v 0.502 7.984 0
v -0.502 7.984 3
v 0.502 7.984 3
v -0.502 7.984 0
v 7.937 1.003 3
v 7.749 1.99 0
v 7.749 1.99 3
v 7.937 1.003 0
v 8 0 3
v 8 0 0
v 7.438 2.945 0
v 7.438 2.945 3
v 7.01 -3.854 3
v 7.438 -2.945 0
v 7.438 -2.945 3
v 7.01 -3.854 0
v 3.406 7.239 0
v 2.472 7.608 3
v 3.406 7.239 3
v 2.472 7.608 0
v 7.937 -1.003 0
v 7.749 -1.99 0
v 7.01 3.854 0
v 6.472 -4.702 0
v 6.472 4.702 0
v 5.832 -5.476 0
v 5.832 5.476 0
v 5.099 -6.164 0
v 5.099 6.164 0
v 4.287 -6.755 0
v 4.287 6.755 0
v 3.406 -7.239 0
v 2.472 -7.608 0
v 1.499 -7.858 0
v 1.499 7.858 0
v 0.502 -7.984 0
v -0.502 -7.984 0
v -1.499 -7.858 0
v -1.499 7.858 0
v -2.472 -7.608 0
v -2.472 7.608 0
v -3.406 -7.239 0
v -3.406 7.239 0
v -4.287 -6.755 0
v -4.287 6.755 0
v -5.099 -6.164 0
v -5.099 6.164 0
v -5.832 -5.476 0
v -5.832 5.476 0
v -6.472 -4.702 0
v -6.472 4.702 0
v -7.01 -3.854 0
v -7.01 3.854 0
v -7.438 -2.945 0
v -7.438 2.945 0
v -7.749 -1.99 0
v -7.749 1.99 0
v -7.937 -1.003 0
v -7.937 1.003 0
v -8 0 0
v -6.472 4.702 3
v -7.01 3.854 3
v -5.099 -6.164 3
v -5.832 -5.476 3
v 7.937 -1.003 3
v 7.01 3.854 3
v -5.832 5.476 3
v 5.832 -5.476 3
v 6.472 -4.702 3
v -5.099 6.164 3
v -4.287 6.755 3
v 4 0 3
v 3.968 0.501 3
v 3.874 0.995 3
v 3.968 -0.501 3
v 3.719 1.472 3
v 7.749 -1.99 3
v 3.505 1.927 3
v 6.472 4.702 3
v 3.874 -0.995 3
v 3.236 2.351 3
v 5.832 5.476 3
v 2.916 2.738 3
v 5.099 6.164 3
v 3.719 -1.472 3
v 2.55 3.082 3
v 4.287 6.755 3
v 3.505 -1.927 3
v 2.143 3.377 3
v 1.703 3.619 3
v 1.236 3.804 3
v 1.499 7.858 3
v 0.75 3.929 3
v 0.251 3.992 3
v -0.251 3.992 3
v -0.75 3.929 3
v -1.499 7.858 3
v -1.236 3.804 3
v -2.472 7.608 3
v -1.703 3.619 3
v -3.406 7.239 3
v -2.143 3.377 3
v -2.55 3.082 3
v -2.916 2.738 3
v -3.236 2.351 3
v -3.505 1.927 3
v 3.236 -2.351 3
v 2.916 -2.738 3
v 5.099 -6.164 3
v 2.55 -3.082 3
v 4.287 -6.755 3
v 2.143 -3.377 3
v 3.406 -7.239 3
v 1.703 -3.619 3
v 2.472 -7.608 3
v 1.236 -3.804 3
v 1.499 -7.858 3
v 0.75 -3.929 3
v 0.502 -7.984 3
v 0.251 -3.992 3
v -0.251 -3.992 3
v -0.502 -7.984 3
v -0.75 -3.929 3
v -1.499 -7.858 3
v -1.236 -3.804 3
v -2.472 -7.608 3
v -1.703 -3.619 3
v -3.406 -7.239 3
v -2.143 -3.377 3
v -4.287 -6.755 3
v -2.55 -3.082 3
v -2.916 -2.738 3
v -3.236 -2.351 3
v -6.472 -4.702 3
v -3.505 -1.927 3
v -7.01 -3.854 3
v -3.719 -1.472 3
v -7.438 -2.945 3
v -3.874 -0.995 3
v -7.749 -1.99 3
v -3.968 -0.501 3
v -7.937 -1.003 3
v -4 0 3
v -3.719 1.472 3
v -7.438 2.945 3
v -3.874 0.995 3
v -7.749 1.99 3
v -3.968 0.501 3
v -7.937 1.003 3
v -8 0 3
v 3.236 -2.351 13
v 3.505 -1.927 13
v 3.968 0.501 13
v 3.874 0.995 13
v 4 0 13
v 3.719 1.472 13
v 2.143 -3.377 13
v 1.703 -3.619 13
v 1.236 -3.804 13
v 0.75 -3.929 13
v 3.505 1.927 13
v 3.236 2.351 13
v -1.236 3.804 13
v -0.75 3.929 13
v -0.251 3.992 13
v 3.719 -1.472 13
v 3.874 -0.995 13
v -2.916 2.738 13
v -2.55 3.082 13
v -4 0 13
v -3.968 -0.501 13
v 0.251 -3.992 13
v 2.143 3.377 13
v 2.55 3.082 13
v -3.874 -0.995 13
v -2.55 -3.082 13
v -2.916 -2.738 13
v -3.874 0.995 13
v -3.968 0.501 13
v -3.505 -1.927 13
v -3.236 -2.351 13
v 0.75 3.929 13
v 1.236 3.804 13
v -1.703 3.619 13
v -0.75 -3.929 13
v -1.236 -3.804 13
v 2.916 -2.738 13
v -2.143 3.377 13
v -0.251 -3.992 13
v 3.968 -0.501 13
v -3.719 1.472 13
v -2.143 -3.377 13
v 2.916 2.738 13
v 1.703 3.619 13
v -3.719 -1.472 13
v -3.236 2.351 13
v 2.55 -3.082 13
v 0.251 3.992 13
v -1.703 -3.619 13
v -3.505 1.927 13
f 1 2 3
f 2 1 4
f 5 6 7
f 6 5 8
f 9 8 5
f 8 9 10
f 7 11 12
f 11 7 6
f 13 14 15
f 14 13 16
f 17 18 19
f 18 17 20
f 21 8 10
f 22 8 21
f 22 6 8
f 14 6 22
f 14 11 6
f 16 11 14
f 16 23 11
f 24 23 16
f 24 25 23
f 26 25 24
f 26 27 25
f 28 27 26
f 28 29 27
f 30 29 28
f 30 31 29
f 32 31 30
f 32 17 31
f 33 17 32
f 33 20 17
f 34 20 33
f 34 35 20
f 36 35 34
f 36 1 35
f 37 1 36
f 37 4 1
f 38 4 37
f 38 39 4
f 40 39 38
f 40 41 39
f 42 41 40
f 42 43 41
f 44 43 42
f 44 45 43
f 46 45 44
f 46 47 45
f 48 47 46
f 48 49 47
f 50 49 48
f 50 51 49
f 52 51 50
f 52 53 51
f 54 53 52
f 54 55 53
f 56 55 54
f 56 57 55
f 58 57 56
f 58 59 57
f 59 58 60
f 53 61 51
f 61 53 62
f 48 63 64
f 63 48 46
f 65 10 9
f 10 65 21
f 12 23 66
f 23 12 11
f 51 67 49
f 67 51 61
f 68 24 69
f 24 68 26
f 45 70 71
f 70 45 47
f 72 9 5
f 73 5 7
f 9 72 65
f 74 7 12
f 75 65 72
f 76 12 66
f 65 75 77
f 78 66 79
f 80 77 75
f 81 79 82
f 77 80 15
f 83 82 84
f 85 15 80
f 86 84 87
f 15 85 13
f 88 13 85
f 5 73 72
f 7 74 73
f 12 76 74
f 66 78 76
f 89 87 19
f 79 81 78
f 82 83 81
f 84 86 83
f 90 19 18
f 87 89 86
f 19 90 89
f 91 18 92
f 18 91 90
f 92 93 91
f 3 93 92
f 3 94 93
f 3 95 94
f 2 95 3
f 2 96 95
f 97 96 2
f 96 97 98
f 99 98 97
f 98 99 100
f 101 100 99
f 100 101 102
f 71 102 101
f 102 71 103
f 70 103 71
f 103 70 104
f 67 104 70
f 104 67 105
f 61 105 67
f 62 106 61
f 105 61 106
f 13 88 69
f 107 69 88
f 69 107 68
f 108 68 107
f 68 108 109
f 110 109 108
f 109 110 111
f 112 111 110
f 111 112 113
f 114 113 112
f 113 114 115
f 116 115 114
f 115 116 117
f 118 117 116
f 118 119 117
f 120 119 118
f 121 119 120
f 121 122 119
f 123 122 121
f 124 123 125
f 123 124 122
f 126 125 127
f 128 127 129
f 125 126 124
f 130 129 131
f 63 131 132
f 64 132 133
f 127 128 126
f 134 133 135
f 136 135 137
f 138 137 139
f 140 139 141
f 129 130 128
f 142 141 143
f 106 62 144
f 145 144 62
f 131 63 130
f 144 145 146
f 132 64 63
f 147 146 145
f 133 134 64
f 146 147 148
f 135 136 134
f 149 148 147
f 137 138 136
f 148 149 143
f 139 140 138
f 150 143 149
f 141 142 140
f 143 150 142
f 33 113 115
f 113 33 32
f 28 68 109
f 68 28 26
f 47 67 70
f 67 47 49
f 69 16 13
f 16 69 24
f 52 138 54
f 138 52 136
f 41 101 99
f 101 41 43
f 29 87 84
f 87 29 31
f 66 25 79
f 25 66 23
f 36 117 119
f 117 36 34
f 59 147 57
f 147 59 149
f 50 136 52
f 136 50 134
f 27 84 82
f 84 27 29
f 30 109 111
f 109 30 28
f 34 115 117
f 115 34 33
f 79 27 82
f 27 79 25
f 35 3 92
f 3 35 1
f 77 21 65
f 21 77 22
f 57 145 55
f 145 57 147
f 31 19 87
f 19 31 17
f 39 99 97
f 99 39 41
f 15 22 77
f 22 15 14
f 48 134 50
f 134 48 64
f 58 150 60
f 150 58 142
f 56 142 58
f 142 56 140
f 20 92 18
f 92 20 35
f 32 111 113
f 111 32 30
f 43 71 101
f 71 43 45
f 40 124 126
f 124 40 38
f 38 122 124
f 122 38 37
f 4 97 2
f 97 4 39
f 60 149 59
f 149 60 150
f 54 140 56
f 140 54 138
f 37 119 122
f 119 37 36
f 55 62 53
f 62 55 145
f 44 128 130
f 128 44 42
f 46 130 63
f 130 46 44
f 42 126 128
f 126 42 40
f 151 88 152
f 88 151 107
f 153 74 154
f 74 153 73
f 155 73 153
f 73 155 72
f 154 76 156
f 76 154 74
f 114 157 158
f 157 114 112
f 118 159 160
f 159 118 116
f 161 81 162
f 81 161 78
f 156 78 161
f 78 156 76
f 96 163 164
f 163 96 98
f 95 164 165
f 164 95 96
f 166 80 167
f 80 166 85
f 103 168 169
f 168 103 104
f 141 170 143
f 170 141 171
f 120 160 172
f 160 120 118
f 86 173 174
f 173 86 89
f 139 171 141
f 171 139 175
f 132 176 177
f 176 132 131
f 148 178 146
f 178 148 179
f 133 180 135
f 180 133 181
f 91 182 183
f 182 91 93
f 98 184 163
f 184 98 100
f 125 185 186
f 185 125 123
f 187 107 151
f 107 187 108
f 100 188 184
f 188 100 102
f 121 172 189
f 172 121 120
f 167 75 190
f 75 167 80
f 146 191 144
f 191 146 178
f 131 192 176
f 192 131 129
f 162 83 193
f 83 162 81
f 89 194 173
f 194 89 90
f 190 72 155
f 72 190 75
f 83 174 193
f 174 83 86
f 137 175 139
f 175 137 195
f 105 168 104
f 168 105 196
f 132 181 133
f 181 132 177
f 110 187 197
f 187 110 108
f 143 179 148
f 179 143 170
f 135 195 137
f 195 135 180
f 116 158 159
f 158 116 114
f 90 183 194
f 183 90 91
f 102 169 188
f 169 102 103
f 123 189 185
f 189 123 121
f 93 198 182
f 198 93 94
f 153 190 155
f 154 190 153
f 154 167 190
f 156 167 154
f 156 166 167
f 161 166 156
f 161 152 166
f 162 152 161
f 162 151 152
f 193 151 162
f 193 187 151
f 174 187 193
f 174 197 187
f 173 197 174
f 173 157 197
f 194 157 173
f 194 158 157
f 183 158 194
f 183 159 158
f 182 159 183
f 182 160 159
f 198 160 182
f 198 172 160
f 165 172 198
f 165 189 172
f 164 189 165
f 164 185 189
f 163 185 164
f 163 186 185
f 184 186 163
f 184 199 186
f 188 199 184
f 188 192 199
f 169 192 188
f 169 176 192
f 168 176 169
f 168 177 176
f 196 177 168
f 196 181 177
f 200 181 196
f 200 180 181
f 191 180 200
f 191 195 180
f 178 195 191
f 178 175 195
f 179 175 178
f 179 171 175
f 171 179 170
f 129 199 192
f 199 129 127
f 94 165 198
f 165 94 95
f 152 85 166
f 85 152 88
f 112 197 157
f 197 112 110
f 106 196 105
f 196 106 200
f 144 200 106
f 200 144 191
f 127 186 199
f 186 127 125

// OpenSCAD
// file: ../../lib/joint/joint_pin.scad
// Pin Connectors V2
// Tony Buser <tbuser@gmail.com>

//pin_tack(h=10);

module pin_simple(h=10, r=4, bh=3, br=8) {
  // bh = base_height
  // br = base_radius

  union() {
    cylinder(h=bh, r=br, $fn=50);
    translate([0, 0, bh]) cylinder(h=h, r=r, $fn=50);
  }
}

module pin_tack(h=10, r=4, lh=3, lt=1, bh=3, br=4) {
  // bh = base_height
  // br = base_radius
  
  union() {
    cylinder(h=bh, r=br, $fn=50);
    translate([0, 0, bh]) pin(h, r, lh, lt);
  }
}
// just call pin instead, I made this module because it was easier to do the rotation option this way
// since openscad complains of recursion if I did it all in one module
module pin(h=10, r=4, lh=3, lt=1) {
  // h = shaft height
  // r = shaft radius
  // lh = lip height
  // lt = lip thickness

  difference() {
    pin_solid(h, r, lh, lt);
    
    // center cut
    translate([-r*0.5/2, -(r*2+lt*2)/2, h/4]) cube([r*0.5, r*2+lt*2, h]);
    translate([0, 0, h/4]) cylinder(h=h+lh, r=r/2.5, $fn=50);
    // center curve
    // translate([0, 0, h/4]) rotate([90, 0, 0]) cylinder(h=r*2, r=r*0.5/2, center=true, $fn=50);
  
    // side cuts
    translate([-r*2, -lt-r*1.125, -1]) cube([r*4, lt*2, h+2]);
    translate([-r*2, -lt+r*1.125, -1]) cube([r*4, lt*2, h+2]);
  }
}

// this is mainly to make the pinhole module easier
module pin_solid(h=10, r=4, lh=3, lt=1) {
  union() {
    // shaft
    cylinder(h=h-lh, r=r, $fn=50);
    // lip
    // translate([0, 0, h-lh]) cylinder(h=lh*0.25, r1=r, r2=r+(lt/2), $fn=30);
    // translate([0, 0, h-lh+lh*0.25]) cylinder(h=lh*0.25, r2=r, r1=r+(lt/2), $fn=30);
    // translate([0, 0, h-lh+lh*0.50]) cylinder(h=lh*0.50, r1=r, r2=r-(lt/2), $fn=30);

    // translate([0, 0, h-lh]) cylinder(h=lh*0.50, r1=r, r2=r+(lt/2), $fn=30);
    // translate([0, 0, h-lh+lh*0.50]) cylinder(h=lh*0.50, r1=r+(lt/2), r2=r-(lt/3), $fn=30);    

    translate([0, 0, h-lh]) cylinder(h=lh*0.25, r1=r, r2=r+(lt/2), $fn=50);
    translate([0, 0, h-lh+lh*0.25]) cylinder(h=lh*0.25, r=r+(lt/2), $fn=50);    
    translate([0, 0, h-lh+lh*0.50]) cylinder(h=lh*0.50, r1=r+(lt/2), r2=r-(lt/2), $fn=50);

    // translate([0, 0, h-lh]) cylinder(h=lh, r1=r+(lt/2), r2=1, $fn=30);
    // translate([0, 0, h-lh-lt/2]) cylinder(h=lt/2, r1=r, r2=r+(lt/2), $fn=30);
  }
}
// file: ../../lib/material.scad
module gray() {
	color([.4, .4, .4]) children([0:$children-1]);
}

module black() {
	color([.3, .3, .3]) children([0:$children-1]);
}

module orange() {
	color([1, .7, 0]) children([0:$children-1]);
}

module yellow() {
	color([.7, .7, .3]) children([0:$children-1]);
}

module green_pcb() {
	color([.0, .5, .25]) children([0:$children-1]);
}

module metal() {
	color([.7, .7, .7]) children([0:$children-1]);
}

module gold() {
	color([.8, .5, .0]) children([0:$children-1]);
}

module stainless(no="1.4301") {
	color([0.45, 0.43, 0.5]) children([0:$children-1]);
}

module steel(no) {
	color([0.65, 0.67, 0.72]) children([0:$children-1]);
}

module iron(no="ST37") {
	color([0.36, 0.33, 0.33]) children([0:$children-1]);
}

module plastic() {
	color([1, .7, 0]) children([0:$children-1]);
}
// main file
include <../../lib/material.scad>;
include <../../lib/joint/joint_pin.scad>;

plastic() {
  pin_simple(h=10,bh=3, br=8);
}
